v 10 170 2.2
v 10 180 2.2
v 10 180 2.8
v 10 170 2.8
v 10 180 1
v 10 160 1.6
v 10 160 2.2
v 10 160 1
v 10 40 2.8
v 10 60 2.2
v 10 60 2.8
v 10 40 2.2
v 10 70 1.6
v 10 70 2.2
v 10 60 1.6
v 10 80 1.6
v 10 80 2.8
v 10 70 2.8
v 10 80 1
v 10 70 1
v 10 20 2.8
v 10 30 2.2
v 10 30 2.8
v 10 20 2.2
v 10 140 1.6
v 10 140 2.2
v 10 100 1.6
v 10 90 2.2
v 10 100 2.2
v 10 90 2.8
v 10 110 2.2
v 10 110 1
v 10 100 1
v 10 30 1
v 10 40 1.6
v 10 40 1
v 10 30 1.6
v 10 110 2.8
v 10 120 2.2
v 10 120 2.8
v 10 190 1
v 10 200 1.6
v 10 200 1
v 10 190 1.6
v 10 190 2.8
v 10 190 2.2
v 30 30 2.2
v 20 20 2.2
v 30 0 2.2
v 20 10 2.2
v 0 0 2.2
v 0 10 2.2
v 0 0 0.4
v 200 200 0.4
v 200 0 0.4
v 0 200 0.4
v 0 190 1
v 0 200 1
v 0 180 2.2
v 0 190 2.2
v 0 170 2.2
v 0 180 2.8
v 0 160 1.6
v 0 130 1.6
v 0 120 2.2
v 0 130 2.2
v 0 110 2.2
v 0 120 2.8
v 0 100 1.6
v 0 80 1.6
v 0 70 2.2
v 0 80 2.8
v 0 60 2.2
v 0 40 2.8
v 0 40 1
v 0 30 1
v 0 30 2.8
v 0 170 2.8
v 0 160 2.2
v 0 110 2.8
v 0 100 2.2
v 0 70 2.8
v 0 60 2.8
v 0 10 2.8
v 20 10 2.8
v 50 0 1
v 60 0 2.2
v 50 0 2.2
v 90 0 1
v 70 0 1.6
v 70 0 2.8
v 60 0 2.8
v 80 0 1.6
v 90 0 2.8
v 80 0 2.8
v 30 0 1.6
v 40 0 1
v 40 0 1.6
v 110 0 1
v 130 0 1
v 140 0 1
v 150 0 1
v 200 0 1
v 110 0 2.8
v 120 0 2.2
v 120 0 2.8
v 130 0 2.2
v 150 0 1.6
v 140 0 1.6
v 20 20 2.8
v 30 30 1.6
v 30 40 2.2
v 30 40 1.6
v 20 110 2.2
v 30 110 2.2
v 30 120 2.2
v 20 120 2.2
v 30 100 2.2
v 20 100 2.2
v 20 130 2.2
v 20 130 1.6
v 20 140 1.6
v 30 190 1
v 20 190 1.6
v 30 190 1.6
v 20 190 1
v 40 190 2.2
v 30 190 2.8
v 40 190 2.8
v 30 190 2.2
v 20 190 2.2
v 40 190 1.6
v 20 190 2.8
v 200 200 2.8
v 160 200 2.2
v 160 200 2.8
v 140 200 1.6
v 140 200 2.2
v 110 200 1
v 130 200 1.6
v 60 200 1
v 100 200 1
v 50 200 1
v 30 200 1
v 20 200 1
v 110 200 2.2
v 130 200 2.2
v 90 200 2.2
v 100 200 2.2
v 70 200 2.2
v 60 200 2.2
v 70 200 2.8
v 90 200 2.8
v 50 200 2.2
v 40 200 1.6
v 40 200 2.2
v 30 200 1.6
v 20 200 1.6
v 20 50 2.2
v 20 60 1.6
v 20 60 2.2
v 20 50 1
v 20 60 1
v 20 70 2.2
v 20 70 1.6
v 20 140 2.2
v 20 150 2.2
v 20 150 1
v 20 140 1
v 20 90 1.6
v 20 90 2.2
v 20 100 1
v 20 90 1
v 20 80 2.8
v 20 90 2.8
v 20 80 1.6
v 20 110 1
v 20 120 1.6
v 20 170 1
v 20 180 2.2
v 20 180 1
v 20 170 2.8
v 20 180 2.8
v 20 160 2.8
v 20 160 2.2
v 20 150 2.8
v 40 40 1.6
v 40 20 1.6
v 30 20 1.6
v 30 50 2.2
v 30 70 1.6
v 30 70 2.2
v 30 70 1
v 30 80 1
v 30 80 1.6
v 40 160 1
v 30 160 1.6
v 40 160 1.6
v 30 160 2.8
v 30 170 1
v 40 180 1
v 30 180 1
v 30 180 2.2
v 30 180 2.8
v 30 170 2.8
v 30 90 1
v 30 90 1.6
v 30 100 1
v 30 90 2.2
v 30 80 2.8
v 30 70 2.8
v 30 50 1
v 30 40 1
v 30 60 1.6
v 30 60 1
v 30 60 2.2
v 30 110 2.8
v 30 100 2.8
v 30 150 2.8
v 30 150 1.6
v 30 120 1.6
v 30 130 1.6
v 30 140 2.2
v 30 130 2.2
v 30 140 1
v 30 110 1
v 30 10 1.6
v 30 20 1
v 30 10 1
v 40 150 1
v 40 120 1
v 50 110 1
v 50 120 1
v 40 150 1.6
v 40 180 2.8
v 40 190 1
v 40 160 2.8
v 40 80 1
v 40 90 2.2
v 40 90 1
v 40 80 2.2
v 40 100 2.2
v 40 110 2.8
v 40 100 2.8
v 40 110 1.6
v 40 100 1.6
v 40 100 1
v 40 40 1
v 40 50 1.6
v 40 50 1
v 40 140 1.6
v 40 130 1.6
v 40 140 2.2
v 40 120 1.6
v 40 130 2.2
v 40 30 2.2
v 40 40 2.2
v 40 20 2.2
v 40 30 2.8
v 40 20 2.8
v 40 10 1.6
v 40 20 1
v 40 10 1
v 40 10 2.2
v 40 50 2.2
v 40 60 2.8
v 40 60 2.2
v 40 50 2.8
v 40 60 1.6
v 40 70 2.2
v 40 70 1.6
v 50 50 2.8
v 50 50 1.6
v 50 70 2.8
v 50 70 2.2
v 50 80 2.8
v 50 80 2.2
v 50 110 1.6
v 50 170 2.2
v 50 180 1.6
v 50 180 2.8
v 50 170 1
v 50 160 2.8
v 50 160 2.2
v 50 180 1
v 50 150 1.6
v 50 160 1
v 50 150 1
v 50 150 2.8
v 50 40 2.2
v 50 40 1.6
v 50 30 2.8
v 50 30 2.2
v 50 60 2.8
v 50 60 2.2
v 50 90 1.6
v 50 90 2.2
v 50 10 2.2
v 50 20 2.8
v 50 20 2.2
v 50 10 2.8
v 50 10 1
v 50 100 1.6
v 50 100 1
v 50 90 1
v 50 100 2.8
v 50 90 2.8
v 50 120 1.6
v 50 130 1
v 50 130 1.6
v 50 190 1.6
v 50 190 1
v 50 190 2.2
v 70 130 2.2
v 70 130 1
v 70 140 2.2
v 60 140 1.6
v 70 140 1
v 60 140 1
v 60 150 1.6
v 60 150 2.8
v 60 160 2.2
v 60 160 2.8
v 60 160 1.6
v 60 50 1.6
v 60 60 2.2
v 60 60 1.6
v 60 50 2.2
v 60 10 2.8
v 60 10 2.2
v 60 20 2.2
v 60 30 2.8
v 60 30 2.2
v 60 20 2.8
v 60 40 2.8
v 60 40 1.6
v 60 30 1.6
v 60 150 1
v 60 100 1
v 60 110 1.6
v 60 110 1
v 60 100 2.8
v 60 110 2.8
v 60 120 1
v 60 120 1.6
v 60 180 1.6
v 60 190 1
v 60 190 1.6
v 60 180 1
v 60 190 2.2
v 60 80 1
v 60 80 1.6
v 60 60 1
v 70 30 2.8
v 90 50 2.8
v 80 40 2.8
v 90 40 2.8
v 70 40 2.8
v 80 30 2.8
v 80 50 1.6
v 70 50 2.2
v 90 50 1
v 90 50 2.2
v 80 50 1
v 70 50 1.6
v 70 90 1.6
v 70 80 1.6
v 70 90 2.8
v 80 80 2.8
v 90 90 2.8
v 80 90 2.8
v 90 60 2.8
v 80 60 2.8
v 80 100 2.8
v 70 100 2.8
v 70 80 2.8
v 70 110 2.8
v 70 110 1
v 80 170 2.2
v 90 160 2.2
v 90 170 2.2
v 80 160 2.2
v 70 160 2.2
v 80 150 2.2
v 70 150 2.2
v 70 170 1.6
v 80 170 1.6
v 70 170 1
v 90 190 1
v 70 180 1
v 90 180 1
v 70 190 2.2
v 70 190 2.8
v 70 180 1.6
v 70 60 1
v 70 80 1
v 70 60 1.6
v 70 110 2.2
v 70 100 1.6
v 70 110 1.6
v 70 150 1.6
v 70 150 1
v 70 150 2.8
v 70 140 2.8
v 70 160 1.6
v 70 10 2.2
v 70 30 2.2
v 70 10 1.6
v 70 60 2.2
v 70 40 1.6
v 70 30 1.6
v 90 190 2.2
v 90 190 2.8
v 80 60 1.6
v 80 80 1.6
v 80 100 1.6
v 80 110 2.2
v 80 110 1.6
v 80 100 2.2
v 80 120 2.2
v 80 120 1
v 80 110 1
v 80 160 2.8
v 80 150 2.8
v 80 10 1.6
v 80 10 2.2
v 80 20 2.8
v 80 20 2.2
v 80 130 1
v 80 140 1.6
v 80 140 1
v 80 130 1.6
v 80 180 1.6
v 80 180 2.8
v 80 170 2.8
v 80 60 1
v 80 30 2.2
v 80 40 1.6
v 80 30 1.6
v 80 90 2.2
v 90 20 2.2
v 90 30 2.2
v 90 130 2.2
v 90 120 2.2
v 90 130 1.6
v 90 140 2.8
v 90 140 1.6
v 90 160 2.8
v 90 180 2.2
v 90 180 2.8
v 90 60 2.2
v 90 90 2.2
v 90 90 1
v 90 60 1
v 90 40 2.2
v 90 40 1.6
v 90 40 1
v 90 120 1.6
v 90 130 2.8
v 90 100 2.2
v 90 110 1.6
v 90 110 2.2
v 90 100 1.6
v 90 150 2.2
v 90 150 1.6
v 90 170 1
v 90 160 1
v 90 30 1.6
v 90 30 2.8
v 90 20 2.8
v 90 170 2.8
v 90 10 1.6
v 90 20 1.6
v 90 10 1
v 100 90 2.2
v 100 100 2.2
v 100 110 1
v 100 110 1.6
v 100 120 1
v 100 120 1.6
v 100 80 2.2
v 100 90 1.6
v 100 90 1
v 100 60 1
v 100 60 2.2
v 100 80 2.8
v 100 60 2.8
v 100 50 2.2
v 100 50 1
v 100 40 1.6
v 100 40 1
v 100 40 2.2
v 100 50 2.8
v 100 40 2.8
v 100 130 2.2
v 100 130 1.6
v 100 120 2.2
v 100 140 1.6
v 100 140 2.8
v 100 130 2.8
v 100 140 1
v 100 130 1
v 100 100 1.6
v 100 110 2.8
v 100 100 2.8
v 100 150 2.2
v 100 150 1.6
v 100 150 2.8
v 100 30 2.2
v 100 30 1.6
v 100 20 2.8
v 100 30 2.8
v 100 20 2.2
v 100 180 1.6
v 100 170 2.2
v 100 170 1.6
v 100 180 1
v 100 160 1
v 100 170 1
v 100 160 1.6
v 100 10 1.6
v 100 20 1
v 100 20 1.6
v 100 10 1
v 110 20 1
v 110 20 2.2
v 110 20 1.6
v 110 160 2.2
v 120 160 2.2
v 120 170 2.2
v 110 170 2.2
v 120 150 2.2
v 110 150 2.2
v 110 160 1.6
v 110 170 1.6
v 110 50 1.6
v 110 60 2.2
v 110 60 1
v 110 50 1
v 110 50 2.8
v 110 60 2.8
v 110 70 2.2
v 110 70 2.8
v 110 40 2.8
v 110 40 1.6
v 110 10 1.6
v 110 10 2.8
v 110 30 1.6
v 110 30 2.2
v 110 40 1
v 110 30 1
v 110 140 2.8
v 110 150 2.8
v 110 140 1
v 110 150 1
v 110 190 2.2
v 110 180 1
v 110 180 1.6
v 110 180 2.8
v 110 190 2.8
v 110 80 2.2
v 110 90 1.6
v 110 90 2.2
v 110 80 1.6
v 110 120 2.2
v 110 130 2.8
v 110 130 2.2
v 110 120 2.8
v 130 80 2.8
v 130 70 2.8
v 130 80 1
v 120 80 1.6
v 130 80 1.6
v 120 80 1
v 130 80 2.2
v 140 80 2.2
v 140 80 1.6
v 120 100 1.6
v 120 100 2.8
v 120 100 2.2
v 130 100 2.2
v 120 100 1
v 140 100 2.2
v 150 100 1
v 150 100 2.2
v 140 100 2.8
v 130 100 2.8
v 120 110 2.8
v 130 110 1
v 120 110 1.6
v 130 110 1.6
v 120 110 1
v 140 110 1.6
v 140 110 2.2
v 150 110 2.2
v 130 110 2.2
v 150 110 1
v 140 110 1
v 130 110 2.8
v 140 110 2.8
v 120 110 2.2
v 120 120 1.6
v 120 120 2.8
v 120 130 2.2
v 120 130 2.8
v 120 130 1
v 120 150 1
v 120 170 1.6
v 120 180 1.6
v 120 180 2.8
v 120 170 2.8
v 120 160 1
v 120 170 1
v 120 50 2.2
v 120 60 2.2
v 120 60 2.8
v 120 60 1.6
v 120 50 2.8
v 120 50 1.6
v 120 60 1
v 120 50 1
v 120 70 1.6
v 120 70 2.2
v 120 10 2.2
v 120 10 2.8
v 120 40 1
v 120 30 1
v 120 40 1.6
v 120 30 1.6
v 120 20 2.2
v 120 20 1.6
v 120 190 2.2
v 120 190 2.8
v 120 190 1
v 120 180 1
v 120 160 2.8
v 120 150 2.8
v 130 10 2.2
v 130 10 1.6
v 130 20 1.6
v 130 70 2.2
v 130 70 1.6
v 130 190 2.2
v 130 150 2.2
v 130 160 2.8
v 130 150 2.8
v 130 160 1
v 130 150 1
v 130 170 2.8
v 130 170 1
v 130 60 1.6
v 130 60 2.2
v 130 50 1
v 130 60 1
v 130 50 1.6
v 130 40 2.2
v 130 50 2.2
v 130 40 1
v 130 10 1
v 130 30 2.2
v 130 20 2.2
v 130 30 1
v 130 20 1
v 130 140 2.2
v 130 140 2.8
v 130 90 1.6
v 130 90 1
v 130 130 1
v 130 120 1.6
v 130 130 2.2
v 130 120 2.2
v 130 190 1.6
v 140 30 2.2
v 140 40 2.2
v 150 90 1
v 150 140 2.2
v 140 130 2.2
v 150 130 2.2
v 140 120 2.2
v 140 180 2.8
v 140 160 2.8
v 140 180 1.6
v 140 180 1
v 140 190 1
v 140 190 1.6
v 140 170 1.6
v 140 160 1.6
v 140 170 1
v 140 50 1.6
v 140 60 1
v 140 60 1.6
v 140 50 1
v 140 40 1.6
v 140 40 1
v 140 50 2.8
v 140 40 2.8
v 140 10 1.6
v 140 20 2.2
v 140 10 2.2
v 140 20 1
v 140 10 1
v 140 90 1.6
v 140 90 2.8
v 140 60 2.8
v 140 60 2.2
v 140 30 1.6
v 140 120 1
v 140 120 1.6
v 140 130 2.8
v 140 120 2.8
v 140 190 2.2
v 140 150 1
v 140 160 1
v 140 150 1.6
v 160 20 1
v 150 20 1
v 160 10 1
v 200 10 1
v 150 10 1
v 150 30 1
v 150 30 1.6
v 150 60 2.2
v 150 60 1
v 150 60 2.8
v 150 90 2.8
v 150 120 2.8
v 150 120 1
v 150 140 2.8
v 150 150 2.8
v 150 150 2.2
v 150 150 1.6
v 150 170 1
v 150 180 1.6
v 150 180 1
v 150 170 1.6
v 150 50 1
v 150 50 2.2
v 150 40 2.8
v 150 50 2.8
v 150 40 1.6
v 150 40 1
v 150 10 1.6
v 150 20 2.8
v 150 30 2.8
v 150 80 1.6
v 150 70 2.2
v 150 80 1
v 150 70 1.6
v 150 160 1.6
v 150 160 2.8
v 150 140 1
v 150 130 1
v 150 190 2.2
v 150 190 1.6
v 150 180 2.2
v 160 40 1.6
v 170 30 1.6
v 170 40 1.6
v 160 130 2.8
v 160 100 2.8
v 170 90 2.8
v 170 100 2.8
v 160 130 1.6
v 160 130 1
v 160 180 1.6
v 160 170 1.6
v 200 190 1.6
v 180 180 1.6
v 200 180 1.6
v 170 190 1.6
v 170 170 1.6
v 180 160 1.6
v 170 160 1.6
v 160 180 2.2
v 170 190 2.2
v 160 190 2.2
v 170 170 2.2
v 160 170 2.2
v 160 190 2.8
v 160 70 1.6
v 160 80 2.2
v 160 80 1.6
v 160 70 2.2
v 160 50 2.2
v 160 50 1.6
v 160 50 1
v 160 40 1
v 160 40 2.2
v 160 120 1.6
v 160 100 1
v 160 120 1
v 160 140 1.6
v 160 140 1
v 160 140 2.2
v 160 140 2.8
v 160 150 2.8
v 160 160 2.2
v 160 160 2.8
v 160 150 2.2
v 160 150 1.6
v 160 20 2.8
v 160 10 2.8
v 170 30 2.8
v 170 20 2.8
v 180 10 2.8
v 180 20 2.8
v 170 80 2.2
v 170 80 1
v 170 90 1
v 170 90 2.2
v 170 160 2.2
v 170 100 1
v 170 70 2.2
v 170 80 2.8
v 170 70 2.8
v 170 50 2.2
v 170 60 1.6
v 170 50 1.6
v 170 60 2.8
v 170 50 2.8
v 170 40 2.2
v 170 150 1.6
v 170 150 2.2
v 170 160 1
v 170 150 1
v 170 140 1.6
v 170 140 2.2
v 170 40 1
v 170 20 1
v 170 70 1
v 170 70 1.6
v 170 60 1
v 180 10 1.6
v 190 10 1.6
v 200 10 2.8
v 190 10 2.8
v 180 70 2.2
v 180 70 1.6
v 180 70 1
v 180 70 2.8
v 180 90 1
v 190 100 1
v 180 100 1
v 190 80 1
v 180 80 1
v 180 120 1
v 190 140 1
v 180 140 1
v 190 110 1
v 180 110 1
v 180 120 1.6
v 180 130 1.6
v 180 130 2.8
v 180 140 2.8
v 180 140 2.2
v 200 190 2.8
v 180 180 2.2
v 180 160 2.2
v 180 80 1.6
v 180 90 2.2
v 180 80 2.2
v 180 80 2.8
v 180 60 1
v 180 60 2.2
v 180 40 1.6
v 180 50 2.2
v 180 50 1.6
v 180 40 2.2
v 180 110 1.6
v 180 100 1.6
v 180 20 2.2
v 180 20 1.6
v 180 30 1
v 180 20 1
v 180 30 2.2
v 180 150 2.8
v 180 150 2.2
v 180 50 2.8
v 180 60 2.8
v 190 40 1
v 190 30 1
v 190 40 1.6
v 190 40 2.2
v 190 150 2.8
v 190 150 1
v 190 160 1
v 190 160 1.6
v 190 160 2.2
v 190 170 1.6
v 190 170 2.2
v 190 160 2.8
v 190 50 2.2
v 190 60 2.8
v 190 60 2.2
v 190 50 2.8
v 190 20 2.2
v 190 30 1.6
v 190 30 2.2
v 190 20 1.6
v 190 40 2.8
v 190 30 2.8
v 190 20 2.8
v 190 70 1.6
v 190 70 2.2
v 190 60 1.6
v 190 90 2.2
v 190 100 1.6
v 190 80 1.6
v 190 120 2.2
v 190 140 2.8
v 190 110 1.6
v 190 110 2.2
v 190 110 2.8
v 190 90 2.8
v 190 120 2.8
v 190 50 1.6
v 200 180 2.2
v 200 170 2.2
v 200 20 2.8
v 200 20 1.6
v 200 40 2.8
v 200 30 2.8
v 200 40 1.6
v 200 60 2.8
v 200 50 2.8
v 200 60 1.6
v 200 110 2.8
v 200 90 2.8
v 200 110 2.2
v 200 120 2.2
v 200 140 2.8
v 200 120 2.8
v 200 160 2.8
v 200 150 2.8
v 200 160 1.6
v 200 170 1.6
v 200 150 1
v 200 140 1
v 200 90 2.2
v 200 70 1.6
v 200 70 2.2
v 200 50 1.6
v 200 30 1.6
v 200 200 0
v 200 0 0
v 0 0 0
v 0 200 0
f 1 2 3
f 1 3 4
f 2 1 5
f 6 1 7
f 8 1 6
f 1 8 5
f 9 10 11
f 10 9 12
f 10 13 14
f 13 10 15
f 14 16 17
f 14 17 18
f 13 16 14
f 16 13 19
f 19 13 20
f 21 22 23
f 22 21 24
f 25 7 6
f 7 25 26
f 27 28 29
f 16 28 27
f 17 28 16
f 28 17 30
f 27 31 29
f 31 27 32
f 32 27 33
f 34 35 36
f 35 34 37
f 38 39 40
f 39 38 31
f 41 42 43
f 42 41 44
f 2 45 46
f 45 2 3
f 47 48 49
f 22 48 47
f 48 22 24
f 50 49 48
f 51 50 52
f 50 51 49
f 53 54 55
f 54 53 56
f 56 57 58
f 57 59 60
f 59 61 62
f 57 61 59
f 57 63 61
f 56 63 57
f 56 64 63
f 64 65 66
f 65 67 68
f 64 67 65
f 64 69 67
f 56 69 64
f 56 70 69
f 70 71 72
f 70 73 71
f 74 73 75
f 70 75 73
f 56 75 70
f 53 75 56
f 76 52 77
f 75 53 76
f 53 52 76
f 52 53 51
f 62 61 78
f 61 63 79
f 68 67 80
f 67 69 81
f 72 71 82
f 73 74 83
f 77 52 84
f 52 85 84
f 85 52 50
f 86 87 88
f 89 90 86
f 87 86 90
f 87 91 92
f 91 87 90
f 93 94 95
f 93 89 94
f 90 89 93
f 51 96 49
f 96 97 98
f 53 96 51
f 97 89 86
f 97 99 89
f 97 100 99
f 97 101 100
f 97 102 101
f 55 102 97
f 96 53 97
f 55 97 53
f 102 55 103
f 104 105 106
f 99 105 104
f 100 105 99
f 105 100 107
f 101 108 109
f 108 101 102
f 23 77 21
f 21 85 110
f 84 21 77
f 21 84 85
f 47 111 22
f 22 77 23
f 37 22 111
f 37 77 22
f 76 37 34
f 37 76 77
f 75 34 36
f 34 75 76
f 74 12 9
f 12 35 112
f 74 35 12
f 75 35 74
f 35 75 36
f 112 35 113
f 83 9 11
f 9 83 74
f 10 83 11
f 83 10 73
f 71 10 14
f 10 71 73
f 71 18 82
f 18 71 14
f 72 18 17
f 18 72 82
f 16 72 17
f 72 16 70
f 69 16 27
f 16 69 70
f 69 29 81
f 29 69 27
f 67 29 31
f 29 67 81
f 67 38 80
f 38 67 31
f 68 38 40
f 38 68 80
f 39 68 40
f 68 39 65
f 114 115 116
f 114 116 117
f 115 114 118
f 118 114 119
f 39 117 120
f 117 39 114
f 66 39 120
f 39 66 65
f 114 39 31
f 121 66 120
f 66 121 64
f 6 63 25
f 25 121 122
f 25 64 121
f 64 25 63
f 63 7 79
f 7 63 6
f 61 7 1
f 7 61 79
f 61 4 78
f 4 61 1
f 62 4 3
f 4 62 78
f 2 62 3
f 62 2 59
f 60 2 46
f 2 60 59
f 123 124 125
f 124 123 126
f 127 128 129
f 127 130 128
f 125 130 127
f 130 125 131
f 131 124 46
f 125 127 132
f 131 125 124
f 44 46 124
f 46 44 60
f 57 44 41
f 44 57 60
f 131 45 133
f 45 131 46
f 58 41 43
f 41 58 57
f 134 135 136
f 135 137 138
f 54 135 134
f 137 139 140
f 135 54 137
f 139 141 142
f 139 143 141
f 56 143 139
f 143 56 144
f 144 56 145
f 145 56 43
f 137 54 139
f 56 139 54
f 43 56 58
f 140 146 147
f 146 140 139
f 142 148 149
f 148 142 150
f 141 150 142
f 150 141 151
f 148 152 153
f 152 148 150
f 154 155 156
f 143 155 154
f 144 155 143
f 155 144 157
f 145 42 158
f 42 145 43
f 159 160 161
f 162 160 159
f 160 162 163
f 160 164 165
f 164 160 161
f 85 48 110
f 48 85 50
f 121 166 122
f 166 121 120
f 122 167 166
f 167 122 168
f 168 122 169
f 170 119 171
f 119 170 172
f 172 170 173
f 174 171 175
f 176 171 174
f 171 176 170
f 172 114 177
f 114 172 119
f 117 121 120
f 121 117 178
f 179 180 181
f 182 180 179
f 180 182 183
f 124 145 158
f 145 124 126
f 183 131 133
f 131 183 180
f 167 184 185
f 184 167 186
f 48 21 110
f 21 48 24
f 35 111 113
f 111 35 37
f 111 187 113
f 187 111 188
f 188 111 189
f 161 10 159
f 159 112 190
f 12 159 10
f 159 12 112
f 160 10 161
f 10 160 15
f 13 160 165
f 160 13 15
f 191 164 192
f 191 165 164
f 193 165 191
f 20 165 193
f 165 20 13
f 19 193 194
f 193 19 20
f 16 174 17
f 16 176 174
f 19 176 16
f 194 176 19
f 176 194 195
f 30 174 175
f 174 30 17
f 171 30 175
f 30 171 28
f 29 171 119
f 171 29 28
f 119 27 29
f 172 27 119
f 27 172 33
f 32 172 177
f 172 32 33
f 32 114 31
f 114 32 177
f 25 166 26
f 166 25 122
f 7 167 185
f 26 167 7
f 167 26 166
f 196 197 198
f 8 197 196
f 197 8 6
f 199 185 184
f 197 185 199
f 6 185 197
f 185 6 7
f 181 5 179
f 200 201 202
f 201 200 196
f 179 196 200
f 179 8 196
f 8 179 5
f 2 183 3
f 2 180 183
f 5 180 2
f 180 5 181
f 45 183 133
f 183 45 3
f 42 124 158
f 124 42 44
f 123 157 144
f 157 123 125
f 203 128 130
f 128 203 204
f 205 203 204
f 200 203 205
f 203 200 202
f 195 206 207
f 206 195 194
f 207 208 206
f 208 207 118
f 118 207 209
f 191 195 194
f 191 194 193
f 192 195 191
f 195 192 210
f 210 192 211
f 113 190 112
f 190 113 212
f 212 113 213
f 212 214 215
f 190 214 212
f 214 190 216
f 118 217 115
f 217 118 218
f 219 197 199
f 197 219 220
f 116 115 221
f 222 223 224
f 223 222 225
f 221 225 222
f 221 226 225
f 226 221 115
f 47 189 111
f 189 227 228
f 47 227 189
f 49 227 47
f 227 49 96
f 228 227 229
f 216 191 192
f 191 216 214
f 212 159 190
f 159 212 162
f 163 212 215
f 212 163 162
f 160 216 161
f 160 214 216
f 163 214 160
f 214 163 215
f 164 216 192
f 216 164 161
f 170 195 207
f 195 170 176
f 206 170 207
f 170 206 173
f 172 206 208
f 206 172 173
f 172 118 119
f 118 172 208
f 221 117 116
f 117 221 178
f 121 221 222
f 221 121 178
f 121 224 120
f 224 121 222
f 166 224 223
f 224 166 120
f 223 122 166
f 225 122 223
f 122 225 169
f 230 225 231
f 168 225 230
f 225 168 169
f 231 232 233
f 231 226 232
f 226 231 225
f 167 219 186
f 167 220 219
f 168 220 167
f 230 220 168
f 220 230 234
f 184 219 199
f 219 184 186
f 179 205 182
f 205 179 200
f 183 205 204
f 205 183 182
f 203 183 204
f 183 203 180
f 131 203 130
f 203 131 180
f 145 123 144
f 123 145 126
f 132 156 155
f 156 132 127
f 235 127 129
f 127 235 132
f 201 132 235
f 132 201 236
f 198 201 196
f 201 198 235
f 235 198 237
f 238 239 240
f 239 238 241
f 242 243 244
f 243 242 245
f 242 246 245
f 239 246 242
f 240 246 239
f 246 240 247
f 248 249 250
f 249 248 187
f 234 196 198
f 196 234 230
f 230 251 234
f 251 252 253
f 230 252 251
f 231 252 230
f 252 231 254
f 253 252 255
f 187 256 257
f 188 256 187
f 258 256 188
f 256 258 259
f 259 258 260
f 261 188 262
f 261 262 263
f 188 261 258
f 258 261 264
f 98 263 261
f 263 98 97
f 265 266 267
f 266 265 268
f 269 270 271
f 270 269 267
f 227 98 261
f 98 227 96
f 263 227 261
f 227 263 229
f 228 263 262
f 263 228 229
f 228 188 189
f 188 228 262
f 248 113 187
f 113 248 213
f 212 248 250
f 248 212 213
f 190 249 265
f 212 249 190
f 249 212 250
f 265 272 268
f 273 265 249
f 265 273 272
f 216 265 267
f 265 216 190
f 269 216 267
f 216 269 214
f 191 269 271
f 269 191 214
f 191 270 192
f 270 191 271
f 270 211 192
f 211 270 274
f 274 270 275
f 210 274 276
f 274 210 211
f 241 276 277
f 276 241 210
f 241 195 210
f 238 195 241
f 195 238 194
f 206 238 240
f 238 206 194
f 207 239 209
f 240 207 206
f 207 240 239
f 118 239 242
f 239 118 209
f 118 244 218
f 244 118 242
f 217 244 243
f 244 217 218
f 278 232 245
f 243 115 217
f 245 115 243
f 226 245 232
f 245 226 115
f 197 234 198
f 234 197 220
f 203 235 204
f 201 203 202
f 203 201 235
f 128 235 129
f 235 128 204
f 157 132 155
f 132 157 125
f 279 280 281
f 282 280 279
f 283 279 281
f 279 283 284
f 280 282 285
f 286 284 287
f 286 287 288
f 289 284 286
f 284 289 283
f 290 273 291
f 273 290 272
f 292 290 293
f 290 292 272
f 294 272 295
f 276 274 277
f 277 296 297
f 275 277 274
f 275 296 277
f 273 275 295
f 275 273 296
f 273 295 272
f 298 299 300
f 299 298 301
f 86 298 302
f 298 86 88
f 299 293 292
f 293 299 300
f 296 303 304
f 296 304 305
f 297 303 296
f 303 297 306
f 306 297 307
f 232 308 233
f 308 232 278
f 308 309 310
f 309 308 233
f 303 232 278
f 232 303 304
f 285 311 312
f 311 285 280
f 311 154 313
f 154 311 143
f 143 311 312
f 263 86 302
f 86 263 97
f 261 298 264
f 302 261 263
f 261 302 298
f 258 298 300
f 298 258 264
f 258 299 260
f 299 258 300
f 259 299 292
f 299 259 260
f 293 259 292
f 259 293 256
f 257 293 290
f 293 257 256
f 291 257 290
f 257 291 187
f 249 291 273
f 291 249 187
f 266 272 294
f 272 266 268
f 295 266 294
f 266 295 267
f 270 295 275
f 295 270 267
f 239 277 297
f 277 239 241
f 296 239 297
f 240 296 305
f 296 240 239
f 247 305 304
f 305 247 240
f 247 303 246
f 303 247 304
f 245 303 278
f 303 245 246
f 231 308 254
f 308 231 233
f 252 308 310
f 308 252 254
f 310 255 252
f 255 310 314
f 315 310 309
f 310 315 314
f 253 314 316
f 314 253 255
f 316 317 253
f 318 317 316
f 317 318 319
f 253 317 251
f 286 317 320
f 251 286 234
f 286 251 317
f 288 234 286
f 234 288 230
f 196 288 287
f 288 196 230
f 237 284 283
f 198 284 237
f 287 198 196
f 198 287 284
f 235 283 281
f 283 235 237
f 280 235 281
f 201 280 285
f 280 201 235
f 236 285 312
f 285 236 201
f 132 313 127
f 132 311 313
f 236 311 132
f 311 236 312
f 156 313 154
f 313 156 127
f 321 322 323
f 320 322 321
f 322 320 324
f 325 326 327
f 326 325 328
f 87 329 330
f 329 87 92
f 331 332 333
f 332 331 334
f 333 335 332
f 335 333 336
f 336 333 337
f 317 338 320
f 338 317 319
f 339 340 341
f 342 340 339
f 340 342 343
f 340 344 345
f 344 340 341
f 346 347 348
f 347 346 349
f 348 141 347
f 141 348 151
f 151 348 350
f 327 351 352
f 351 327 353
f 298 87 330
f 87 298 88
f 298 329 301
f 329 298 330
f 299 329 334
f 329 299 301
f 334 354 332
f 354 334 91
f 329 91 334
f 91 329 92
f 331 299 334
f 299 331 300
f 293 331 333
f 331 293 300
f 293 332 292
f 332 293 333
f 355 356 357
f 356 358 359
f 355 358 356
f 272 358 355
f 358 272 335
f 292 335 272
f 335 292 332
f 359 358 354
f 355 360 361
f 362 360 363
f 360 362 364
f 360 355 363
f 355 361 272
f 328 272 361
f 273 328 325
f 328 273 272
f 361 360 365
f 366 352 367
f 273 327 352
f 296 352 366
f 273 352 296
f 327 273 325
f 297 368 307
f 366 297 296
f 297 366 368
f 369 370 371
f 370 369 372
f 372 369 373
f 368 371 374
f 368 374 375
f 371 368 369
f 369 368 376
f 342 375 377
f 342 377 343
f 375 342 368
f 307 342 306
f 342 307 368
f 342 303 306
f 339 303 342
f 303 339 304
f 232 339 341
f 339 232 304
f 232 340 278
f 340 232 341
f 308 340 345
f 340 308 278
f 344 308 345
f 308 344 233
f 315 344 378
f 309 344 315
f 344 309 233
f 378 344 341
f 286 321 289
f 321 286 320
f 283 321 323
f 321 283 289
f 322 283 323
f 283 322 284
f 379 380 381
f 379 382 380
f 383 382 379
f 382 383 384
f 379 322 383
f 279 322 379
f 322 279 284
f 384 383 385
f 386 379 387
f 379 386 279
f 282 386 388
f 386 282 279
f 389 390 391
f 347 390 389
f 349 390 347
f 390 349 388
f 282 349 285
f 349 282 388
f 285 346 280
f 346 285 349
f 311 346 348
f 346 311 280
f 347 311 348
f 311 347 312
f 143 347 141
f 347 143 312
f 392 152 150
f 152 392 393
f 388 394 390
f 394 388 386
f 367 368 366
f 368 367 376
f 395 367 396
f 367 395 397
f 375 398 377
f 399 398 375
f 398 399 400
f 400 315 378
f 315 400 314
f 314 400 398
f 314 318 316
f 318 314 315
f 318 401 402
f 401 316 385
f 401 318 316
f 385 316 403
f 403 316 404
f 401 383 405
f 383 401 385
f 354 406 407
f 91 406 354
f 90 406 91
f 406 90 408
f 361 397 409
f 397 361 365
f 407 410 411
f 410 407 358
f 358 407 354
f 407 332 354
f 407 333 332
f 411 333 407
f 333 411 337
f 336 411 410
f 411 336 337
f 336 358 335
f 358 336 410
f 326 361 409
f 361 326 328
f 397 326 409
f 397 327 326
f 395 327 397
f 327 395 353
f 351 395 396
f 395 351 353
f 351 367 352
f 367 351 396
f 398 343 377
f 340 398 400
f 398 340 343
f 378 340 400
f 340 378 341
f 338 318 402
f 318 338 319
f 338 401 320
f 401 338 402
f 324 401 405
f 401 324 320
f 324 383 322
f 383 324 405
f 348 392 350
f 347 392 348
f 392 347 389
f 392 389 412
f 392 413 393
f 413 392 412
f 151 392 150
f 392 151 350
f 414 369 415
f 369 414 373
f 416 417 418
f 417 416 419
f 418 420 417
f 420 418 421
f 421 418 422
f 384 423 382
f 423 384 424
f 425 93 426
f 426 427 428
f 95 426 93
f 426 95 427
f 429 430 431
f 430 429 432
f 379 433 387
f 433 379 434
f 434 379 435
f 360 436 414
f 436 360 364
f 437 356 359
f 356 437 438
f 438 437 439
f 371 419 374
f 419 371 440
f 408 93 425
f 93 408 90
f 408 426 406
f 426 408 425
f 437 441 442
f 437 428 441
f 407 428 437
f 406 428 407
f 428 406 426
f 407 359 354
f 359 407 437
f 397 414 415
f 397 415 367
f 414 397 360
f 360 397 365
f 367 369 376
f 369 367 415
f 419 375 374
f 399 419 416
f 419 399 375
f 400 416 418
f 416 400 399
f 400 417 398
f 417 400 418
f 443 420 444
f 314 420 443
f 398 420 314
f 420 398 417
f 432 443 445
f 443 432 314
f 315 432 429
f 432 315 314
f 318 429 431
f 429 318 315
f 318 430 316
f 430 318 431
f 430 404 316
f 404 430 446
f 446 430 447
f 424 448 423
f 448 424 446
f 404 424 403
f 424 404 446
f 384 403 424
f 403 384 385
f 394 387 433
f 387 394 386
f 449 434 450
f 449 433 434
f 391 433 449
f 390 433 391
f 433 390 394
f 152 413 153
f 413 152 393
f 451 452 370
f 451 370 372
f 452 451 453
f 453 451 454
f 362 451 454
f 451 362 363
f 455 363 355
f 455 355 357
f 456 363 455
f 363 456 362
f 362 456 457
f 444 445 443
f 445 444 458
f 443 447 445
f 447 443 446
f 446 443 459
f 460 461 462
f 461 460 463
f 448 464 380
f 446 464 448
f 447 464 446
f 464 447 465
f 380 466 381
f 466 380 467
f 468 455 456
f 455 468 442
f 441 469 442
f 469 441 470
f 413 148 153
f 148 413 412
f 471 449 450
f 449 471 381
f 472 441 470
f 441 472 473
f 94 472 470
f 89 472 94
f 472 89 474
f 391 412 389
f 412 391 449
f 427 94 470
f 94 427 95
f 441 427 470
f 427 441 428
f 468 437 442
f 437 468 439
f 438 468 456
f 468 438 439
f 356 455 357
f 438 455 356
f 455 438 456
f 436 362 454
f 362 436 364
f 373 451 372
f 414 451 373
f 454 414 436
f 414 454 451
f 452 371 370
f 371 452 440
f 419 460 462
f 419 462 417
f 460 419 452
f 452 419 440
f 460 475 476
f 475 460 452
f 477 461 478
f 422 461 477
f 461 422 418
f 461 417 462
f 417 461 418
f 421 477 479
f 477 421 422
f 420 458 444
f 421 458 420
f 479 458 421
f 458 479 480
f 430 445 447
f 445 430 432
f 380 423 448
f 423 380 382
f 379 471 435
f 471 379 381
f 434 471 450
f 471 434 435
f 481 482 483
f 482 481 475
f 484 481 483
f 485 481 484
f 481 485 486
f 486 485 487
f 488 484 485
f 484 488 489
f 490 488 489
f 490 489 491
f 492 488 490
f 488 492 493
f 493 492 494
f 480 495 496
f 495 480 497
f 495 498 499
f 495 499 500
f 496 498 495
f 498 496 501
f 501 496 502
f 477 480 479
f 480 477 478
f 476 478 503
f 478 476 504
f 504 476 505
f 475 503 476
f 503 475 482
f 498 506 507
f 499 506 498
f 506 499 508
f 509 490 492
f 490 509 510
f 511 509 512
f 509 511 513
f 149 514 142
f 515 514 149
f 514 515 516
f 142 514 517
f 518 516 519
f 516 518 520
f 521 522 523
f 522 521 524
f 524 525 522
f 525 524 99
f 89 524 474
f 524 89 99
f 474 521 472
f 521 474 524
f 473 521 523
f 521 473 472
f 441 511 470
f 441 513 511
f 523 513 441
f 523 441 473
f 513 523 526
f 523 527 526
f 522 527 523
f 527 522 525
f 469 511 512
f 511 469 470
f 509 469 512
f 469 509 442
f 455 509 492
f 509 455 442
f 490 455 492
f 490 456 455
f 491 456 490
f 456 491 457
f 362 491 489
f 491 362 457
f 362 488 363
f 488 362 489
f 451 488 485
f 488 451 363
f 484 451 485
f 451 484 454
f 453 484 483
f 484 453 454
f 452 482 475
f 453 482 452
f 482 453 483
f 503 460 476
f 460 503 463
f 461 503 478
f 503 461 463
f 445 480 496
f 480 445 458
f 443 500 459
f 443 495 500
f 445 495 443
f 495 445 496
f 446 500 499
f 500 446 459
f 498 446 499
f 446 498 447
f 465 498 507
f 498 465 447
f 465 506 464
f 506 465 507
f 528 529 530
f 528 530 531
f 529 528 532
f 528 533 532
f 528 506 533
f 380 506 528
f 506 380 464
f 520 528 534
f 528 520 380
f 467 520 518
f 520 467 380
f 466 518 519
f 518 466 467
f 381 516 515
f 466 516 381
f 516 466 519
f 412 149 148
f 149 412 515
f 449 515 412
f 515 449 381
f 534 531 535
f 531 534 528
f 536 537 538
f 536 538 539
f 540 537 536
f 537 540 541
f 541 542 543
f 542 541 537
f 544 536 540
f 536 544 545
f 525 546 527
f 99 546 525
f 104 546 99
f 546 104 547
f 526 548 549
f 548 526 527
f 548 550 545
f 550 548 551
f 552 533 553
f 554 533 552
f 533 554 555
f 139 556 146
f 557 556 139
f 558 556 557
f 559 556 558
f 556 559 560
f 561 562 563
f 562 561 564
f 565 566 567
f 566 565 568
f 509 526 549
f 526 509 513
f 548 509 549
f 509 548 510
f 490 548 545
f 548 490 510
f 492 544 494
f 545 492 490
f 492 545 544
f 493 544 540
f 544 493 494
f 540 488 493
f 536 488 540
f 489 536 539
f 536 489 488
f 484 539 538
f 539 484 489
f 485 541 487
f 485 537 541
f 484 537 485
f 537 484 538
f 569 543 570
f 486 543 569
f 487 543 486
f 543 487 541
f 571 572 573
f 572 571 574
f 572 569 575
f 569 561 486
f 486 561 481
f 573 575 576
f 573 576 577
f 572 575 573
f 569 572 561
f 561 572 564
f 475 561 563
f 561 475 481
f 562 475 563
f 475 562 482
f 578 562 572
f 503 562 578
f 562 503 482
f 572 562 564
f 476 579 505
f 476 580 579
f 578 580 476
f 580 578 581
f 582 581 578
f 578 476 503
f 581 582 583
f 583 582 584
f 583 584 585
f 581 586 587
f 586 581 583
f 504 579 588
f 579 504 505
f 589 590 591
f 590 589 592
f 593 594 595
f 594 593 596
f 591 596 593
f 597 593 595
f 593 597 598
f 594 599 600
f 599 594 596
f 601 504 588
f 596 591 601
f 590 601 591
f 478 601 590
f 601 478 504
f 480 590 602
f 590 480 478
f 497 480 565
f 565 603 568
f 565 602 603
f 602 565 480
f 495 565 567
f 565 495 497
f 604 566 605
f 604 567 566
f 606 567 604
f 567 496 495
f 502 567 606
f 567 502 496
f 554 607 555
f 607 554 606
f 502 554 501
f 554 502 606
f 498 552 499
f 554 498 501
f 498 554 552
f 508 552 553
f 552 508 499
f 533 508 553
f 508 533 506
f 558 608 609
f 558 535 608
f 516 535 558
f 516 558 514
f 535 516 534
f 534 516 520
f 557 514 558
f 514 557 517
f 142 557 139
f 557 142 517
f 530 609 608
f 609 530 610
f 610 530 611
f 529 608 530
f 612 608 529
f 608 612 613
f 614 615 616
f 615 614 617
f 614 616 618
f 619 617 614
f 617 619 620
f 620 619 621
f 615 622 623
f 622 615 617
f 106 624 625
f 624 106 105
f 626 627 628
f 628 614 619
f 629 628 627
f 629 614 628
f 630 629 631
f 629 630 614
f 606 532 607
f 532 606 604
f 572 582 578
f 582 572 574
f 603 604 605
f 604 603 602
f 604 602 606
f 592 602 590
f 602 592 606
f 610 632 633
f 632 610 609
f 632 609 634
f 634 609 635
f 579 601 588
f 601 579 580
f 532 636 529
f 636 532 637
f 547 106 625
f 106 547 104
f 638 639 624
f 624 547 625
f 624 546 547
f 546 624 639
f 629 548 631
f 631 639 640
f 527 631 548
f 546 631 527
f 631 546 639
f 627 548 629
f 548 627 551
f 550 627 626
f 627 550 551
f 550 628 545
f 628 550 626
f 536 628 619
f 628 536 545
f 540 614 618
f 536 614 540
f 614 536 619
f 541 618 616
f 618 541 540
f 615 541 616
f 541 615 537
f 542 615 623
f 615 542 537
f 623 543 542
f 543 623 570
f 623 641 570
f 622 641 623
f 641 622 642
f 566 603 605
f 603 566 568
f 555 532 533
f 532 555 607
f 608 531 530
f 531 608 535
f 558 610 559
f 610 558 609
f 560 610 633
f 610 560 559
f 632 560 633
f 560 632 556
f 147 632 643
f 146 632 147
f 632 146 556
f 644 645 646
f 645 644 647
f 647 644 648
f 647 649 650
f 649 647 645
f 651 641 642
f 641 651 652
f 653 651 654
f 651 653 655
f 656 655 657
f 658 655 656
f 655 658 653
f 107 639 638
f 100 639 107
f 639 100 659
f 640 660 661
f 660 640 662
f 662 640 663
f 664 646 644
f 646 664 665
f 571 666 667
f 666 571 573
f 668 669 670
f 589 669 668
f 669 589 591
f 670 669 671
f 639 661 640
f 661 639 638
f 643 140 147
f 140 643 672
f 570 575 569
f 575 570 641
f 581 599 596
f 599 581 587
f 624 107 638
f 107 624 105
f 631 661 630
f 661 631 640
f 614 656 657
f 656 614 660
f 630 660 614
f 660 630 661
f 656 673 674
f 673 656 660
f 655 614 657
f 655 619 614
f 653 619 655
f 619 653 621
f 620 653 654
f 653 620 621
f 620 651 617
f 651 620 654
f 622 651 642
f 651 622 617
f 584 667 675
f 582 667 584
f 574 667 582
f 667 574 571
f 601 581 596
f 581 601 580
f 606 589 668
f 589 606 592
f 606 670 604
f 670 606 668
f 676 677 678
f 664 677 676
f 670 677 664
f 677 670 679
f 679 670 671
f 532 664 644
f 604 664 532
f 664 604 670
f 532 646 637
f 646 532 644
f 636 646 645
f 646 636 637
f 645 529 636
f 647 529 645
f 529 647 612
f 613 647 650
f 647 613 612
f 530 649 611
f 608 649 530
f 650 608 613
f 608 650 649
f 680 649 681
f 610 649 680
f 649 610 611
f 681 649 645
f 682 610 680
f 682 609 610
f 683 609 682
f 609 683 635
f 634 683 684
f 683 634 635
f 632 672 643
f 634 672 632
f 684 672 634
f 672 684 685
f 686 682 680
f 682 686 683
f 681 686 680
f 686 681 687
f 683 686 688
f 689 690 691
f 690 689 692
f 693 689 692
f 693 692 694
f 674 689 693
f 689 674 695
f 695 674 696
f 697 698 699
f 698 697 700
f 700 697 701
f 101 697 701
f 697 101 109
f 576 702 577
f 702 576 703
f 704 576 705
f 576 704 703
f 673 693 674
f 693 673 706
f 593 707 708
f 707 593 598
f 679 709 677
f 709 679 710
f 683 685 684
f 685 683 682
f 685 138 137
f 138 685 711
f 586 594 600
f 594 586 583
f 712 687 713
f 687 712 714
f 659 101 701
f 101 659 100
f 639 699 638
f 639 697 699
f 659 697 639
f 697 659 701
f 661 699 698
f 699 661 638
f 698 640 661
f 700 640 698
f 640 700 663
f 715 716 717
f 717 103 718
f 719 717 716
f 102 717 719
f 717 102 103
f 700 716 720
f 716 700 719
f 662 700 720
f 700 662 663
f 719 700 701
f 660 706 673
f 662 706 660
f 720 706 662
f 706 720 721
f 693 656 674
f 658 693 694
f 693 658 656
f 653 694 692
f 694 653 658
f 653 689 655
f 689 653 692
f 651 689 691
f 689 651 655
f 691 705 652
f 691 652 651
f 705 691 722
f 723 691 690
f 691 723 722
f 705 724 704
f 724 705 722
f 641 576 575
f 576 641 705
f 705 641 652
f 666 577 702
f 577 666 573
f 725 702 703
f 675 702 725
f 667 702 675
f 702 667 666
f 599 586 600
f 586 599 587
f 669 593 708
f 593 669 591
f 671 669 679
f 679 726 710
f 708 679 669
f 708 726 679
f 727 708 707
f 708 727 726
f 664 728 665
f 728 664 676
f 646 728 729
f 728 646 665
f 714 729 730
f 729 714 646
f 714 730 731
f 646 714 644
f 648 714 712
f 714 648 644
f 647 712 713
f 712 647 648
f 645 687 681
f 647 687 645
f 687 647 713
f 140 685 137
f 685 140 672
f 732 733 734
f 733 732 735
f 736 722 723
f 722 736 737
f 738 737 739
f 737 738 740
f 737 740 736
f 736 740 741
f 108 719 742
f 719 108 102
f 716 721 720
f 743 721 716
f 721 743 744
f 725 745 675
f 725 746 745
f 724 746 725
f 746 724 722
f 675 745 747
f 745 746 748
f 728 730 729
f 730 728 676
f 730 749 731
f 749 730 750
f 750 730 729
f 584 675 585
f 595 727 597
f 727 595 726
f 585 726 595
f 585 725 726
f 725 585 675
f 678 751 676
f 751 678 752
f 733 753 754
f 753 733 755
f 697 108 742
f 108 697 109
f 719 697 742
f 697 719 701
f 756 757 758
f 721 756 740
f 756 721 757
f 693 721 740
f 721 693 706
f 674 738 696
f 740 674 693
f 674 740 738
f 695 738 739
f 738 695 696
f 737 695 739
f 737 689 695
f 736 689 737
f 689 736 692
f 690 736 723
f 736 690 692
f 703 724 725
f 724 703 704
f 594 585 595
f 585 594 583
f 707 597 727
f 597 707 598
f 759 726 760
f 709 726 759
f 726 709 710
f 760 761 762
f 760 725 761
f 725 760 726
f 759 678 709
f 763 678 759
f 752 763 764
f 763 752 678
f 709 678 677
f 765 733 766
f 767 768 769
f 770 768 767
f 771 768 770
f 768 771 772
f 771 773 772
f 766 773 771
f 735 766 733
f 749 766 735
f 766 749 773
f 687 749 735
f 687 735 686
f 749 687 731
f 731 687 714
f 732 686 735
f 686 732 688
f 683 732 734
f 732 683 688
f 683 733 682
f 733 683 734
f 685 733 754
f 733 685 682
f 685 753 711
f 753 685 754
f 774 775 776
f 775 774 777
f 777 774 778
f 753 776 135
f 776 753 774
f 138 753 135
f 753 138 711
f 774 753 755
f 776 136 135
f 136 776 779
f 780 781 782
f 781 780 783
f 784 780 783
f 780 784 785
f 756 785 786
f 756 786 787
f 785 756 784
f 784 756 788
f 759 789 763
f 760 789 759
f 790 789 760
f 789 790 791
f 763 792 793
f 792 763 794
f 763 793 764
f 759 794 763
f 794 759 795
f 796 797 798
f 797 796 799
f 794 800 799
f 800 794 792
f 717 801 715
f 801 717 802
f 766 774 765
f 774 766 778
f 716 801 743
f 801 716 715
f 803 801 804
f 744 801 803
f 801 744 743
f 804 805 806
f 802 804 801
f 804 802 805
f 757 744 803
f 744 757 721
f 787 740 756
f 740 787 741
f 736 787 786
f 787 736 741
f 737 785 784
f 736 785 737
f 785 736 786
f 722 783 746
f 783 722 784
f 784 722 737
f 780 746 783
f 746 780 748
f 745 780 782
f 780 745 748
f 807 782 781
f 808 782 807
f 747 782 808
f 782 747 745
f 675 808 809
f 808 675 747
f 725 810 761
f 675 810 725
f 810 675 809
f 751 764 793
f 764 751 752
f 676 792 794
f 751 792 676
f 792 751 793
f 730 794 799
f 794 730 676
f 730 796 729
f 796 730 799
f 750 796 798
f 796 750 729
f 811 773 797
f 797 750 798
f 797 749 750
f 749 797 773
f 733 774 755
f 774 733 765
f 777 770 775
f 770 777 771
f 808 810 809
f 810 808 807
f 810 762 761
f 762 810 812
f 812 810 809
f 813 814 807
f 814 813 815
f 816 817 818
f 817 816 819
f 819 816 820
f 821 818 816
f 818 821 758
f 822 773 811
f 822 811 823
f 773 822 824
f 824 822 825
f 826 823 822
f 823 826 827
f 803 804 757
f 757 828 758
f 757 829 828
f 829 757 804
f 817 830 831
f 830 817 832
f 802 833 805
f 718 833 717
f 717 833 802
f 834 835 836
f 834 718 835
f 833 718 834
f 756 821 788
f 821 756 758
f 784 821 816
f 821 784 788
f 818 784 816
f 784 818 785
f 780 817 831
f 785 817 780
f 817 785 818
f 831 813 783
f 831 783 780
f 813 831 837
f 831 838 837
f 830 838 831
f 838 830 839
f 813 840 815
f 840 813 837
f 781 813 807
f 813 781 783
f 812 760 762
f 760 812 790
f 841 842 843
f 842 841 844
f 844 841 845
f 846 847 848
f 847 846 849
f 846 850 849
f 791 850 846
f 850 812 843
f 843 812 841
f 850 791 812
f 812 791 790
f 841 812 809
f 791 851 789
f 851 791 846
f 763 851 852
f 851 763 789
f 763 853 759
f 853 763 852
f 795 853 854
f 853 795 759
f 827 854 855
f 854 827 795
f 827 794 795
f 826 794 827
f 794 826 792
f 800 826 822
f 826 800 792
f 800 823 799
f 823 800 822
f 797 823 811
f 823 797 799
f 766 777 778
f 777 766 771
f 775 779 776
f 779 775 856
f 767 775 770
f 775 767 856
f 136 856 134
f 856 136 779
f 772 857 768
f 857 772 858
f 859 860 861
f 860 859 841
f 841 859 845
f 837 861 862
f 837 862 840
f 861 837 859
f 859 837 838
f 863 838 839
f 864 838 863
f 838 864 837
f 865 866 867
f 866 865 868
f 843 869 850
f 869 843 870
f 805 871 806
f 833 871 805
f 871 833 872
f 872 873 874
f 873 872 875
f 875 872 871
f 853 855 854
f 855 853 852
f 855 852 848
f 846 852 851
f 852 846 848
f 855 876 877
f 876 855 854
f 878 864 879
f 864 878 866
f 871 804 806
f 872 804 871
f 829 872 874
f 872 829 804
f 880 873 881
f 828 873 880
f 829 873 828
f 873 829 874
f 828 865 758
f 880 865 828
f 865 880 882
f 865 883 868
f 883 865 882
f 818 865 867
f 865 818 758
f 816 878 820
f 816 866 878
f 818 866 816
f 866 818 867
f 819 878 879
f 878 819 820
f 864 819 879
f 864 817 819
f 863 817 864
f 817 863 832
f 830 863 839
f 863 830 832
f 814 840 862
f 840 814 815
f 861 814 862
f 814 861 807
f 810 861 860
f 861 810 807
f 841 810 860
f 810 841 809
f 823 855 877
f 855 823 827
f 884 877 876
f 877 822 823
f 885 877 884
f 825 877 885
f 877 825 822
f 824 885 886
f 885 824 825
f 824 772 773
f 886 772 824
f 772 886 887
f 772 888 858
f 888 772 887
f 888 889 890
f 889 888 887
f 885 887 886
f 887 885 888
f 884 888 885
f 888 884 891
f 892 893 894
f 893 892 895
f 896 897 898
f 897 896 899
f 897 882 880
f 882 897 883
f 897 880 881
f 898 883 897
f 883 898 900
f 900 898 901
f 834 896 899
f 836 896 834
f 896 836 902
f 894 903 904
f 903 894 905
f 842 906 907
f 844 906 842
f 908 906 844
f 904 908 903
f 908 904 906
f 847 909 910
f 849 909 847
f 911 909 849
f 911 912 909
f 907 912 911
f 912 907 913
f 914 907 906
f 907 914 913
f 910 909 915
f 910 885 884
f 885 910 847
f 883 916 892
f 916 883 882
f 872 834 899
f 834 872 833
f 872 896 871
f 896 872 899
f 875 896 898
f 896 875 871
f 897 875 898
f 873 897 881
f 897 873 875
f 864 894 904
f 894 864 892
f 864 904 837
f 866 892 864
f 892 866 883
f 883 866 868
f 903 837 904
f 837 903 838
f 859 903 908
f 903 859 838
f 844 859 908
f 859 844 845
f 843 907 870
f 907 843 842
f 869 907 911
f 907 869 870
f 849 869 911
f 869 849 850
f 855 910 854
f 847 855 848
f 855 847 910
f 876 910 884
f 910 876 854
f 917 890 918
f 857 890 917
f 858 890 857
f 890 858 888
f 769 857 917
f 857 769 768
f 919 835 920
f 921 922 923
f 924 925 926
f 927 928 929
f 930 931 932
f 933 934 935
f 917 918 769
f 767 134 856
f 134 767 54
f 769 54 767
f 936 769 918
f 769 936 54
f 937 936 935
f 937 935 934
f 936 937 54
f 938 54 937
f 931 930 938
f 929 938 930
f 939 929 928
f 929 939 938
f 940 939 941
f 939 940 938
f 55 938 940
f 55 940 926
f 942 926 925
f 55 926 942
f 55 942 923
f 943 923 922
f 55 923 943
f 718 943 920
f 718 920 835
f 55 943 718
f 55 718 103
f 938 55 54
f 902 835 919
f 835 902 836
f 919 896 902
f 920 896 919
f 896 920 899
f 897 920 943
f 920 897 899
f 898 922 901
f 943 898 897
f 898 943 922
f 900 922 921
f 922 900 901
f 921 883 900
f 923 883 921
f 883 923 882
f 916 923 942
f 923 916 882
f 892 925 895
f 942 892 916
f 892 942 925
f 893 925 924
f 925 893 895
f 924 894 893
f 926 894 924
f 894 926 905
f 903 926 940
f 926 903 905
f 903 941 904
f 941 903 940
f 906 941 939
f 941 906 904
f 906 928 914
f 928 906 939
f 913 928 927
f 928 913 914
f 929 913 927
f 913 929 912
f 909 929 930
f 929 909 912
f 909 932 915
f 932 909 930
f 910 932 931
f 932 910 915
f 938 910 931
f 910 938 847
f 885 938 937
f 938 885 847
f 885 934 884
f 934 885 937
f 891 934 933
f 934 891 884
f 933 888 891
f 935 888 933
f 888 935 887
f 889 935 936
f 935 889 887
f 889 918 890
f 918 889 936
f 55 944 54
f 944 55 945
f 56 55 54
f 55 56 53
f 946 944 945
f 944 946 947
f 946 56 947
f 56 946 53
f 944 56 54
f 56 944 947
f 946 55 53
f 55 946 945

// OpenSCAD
// Grid of squares using random extruders, each square a random height

// Base height
_BaseHeight = 0.4;

// Square height multiplier
_SquareHeightMul = 0.6;

// Square width
_SquareWidth = 10;

// Square depth
_SquareDepth = 10;

// Square count, X
_SquareCountX = 20;

// Square count, Y
_SquareCountY = 20;

// Random seed for extruders
_SeedExtruder = 99;

// Random seed for heights
_SeedHeight = 13;

// Extruder to render
_WhichExtruder = "All"; // ["All", 1, 2, 3, 4, 5]

// Map a value of _WhichExtruder to an OpenSCAD color
function ExtruderColor(Extruder) = 
  (Extruder == 1  ) ? "red"    : 
  (Extruder == 2  ) ? "green"  : 
  (Extruder == 3  ) ? "blue"   : 
  (Extruder == 4  ) ? "pink"   :
  (Extruder == 5  ) ? "yellow" :
                      "purple" ;

// If _WhichExtruder is "All" or is not "All" and matches the requested extruder, render 
// the child nodes.

module Extruder(DoExtruder)
{
	color(ExtruderColor(DoExtruder))
	{
		if (_WhichExtruder == "All" || DoExtruder == _WhichExtruder)
		{
			children();
		}
	}
}

module Base()
{
	Extruder(1)
	{
		cube([_SquareWidth * _SquareCountX, _SquareDepth * _SquareCountY, _BaseHeight], center = false);
	}
}

module Grid(Extruders, Heights)
{
	for (X = [0 : _SquareCountX - 1])
	{
		for (Y = [0 : _SquareCountY - 1])
		{
			PointX = X * _SquareWidth;
			PointY = Y * _SquareDepth;
			
			translate([PointX, PointY, 0])
			{
				Ex = Extruders[X * _SquareCountX + Y];
				Hi = Heights[X * _SquareCountX + Y];
				
				Extruder(Ex)
				{
					cube([_SquareWidth, _SquareDepth, Hi], center=false);
				}
			}
		}
	}
}

module main()
{
	// Generate a list of all needed random extruders
	ExRand = rands(1, 6, _SquareCountX * _SquareCountY, _SeedExtruder);
	Extruders = [for (i = [0 : (_SquareCountX * _SquareCountY) - 1]) floor(ExRand[i])];
	
	// Generate a list of all needed random heights
	ExHeight = rands(1, 5, _SquareCountX * _SquareCountY, _SeedHeight);
	Heights = [for (i = [0 : (_SquareCountX * _SquareCountY) - 1]) floor(ExHeight[i]) * _SquareHeightMul];
	
	Base();
	translate([0, 0, _BaseHeight])
	{
		Grid(Extruders, Heights);
	}
}

main();
